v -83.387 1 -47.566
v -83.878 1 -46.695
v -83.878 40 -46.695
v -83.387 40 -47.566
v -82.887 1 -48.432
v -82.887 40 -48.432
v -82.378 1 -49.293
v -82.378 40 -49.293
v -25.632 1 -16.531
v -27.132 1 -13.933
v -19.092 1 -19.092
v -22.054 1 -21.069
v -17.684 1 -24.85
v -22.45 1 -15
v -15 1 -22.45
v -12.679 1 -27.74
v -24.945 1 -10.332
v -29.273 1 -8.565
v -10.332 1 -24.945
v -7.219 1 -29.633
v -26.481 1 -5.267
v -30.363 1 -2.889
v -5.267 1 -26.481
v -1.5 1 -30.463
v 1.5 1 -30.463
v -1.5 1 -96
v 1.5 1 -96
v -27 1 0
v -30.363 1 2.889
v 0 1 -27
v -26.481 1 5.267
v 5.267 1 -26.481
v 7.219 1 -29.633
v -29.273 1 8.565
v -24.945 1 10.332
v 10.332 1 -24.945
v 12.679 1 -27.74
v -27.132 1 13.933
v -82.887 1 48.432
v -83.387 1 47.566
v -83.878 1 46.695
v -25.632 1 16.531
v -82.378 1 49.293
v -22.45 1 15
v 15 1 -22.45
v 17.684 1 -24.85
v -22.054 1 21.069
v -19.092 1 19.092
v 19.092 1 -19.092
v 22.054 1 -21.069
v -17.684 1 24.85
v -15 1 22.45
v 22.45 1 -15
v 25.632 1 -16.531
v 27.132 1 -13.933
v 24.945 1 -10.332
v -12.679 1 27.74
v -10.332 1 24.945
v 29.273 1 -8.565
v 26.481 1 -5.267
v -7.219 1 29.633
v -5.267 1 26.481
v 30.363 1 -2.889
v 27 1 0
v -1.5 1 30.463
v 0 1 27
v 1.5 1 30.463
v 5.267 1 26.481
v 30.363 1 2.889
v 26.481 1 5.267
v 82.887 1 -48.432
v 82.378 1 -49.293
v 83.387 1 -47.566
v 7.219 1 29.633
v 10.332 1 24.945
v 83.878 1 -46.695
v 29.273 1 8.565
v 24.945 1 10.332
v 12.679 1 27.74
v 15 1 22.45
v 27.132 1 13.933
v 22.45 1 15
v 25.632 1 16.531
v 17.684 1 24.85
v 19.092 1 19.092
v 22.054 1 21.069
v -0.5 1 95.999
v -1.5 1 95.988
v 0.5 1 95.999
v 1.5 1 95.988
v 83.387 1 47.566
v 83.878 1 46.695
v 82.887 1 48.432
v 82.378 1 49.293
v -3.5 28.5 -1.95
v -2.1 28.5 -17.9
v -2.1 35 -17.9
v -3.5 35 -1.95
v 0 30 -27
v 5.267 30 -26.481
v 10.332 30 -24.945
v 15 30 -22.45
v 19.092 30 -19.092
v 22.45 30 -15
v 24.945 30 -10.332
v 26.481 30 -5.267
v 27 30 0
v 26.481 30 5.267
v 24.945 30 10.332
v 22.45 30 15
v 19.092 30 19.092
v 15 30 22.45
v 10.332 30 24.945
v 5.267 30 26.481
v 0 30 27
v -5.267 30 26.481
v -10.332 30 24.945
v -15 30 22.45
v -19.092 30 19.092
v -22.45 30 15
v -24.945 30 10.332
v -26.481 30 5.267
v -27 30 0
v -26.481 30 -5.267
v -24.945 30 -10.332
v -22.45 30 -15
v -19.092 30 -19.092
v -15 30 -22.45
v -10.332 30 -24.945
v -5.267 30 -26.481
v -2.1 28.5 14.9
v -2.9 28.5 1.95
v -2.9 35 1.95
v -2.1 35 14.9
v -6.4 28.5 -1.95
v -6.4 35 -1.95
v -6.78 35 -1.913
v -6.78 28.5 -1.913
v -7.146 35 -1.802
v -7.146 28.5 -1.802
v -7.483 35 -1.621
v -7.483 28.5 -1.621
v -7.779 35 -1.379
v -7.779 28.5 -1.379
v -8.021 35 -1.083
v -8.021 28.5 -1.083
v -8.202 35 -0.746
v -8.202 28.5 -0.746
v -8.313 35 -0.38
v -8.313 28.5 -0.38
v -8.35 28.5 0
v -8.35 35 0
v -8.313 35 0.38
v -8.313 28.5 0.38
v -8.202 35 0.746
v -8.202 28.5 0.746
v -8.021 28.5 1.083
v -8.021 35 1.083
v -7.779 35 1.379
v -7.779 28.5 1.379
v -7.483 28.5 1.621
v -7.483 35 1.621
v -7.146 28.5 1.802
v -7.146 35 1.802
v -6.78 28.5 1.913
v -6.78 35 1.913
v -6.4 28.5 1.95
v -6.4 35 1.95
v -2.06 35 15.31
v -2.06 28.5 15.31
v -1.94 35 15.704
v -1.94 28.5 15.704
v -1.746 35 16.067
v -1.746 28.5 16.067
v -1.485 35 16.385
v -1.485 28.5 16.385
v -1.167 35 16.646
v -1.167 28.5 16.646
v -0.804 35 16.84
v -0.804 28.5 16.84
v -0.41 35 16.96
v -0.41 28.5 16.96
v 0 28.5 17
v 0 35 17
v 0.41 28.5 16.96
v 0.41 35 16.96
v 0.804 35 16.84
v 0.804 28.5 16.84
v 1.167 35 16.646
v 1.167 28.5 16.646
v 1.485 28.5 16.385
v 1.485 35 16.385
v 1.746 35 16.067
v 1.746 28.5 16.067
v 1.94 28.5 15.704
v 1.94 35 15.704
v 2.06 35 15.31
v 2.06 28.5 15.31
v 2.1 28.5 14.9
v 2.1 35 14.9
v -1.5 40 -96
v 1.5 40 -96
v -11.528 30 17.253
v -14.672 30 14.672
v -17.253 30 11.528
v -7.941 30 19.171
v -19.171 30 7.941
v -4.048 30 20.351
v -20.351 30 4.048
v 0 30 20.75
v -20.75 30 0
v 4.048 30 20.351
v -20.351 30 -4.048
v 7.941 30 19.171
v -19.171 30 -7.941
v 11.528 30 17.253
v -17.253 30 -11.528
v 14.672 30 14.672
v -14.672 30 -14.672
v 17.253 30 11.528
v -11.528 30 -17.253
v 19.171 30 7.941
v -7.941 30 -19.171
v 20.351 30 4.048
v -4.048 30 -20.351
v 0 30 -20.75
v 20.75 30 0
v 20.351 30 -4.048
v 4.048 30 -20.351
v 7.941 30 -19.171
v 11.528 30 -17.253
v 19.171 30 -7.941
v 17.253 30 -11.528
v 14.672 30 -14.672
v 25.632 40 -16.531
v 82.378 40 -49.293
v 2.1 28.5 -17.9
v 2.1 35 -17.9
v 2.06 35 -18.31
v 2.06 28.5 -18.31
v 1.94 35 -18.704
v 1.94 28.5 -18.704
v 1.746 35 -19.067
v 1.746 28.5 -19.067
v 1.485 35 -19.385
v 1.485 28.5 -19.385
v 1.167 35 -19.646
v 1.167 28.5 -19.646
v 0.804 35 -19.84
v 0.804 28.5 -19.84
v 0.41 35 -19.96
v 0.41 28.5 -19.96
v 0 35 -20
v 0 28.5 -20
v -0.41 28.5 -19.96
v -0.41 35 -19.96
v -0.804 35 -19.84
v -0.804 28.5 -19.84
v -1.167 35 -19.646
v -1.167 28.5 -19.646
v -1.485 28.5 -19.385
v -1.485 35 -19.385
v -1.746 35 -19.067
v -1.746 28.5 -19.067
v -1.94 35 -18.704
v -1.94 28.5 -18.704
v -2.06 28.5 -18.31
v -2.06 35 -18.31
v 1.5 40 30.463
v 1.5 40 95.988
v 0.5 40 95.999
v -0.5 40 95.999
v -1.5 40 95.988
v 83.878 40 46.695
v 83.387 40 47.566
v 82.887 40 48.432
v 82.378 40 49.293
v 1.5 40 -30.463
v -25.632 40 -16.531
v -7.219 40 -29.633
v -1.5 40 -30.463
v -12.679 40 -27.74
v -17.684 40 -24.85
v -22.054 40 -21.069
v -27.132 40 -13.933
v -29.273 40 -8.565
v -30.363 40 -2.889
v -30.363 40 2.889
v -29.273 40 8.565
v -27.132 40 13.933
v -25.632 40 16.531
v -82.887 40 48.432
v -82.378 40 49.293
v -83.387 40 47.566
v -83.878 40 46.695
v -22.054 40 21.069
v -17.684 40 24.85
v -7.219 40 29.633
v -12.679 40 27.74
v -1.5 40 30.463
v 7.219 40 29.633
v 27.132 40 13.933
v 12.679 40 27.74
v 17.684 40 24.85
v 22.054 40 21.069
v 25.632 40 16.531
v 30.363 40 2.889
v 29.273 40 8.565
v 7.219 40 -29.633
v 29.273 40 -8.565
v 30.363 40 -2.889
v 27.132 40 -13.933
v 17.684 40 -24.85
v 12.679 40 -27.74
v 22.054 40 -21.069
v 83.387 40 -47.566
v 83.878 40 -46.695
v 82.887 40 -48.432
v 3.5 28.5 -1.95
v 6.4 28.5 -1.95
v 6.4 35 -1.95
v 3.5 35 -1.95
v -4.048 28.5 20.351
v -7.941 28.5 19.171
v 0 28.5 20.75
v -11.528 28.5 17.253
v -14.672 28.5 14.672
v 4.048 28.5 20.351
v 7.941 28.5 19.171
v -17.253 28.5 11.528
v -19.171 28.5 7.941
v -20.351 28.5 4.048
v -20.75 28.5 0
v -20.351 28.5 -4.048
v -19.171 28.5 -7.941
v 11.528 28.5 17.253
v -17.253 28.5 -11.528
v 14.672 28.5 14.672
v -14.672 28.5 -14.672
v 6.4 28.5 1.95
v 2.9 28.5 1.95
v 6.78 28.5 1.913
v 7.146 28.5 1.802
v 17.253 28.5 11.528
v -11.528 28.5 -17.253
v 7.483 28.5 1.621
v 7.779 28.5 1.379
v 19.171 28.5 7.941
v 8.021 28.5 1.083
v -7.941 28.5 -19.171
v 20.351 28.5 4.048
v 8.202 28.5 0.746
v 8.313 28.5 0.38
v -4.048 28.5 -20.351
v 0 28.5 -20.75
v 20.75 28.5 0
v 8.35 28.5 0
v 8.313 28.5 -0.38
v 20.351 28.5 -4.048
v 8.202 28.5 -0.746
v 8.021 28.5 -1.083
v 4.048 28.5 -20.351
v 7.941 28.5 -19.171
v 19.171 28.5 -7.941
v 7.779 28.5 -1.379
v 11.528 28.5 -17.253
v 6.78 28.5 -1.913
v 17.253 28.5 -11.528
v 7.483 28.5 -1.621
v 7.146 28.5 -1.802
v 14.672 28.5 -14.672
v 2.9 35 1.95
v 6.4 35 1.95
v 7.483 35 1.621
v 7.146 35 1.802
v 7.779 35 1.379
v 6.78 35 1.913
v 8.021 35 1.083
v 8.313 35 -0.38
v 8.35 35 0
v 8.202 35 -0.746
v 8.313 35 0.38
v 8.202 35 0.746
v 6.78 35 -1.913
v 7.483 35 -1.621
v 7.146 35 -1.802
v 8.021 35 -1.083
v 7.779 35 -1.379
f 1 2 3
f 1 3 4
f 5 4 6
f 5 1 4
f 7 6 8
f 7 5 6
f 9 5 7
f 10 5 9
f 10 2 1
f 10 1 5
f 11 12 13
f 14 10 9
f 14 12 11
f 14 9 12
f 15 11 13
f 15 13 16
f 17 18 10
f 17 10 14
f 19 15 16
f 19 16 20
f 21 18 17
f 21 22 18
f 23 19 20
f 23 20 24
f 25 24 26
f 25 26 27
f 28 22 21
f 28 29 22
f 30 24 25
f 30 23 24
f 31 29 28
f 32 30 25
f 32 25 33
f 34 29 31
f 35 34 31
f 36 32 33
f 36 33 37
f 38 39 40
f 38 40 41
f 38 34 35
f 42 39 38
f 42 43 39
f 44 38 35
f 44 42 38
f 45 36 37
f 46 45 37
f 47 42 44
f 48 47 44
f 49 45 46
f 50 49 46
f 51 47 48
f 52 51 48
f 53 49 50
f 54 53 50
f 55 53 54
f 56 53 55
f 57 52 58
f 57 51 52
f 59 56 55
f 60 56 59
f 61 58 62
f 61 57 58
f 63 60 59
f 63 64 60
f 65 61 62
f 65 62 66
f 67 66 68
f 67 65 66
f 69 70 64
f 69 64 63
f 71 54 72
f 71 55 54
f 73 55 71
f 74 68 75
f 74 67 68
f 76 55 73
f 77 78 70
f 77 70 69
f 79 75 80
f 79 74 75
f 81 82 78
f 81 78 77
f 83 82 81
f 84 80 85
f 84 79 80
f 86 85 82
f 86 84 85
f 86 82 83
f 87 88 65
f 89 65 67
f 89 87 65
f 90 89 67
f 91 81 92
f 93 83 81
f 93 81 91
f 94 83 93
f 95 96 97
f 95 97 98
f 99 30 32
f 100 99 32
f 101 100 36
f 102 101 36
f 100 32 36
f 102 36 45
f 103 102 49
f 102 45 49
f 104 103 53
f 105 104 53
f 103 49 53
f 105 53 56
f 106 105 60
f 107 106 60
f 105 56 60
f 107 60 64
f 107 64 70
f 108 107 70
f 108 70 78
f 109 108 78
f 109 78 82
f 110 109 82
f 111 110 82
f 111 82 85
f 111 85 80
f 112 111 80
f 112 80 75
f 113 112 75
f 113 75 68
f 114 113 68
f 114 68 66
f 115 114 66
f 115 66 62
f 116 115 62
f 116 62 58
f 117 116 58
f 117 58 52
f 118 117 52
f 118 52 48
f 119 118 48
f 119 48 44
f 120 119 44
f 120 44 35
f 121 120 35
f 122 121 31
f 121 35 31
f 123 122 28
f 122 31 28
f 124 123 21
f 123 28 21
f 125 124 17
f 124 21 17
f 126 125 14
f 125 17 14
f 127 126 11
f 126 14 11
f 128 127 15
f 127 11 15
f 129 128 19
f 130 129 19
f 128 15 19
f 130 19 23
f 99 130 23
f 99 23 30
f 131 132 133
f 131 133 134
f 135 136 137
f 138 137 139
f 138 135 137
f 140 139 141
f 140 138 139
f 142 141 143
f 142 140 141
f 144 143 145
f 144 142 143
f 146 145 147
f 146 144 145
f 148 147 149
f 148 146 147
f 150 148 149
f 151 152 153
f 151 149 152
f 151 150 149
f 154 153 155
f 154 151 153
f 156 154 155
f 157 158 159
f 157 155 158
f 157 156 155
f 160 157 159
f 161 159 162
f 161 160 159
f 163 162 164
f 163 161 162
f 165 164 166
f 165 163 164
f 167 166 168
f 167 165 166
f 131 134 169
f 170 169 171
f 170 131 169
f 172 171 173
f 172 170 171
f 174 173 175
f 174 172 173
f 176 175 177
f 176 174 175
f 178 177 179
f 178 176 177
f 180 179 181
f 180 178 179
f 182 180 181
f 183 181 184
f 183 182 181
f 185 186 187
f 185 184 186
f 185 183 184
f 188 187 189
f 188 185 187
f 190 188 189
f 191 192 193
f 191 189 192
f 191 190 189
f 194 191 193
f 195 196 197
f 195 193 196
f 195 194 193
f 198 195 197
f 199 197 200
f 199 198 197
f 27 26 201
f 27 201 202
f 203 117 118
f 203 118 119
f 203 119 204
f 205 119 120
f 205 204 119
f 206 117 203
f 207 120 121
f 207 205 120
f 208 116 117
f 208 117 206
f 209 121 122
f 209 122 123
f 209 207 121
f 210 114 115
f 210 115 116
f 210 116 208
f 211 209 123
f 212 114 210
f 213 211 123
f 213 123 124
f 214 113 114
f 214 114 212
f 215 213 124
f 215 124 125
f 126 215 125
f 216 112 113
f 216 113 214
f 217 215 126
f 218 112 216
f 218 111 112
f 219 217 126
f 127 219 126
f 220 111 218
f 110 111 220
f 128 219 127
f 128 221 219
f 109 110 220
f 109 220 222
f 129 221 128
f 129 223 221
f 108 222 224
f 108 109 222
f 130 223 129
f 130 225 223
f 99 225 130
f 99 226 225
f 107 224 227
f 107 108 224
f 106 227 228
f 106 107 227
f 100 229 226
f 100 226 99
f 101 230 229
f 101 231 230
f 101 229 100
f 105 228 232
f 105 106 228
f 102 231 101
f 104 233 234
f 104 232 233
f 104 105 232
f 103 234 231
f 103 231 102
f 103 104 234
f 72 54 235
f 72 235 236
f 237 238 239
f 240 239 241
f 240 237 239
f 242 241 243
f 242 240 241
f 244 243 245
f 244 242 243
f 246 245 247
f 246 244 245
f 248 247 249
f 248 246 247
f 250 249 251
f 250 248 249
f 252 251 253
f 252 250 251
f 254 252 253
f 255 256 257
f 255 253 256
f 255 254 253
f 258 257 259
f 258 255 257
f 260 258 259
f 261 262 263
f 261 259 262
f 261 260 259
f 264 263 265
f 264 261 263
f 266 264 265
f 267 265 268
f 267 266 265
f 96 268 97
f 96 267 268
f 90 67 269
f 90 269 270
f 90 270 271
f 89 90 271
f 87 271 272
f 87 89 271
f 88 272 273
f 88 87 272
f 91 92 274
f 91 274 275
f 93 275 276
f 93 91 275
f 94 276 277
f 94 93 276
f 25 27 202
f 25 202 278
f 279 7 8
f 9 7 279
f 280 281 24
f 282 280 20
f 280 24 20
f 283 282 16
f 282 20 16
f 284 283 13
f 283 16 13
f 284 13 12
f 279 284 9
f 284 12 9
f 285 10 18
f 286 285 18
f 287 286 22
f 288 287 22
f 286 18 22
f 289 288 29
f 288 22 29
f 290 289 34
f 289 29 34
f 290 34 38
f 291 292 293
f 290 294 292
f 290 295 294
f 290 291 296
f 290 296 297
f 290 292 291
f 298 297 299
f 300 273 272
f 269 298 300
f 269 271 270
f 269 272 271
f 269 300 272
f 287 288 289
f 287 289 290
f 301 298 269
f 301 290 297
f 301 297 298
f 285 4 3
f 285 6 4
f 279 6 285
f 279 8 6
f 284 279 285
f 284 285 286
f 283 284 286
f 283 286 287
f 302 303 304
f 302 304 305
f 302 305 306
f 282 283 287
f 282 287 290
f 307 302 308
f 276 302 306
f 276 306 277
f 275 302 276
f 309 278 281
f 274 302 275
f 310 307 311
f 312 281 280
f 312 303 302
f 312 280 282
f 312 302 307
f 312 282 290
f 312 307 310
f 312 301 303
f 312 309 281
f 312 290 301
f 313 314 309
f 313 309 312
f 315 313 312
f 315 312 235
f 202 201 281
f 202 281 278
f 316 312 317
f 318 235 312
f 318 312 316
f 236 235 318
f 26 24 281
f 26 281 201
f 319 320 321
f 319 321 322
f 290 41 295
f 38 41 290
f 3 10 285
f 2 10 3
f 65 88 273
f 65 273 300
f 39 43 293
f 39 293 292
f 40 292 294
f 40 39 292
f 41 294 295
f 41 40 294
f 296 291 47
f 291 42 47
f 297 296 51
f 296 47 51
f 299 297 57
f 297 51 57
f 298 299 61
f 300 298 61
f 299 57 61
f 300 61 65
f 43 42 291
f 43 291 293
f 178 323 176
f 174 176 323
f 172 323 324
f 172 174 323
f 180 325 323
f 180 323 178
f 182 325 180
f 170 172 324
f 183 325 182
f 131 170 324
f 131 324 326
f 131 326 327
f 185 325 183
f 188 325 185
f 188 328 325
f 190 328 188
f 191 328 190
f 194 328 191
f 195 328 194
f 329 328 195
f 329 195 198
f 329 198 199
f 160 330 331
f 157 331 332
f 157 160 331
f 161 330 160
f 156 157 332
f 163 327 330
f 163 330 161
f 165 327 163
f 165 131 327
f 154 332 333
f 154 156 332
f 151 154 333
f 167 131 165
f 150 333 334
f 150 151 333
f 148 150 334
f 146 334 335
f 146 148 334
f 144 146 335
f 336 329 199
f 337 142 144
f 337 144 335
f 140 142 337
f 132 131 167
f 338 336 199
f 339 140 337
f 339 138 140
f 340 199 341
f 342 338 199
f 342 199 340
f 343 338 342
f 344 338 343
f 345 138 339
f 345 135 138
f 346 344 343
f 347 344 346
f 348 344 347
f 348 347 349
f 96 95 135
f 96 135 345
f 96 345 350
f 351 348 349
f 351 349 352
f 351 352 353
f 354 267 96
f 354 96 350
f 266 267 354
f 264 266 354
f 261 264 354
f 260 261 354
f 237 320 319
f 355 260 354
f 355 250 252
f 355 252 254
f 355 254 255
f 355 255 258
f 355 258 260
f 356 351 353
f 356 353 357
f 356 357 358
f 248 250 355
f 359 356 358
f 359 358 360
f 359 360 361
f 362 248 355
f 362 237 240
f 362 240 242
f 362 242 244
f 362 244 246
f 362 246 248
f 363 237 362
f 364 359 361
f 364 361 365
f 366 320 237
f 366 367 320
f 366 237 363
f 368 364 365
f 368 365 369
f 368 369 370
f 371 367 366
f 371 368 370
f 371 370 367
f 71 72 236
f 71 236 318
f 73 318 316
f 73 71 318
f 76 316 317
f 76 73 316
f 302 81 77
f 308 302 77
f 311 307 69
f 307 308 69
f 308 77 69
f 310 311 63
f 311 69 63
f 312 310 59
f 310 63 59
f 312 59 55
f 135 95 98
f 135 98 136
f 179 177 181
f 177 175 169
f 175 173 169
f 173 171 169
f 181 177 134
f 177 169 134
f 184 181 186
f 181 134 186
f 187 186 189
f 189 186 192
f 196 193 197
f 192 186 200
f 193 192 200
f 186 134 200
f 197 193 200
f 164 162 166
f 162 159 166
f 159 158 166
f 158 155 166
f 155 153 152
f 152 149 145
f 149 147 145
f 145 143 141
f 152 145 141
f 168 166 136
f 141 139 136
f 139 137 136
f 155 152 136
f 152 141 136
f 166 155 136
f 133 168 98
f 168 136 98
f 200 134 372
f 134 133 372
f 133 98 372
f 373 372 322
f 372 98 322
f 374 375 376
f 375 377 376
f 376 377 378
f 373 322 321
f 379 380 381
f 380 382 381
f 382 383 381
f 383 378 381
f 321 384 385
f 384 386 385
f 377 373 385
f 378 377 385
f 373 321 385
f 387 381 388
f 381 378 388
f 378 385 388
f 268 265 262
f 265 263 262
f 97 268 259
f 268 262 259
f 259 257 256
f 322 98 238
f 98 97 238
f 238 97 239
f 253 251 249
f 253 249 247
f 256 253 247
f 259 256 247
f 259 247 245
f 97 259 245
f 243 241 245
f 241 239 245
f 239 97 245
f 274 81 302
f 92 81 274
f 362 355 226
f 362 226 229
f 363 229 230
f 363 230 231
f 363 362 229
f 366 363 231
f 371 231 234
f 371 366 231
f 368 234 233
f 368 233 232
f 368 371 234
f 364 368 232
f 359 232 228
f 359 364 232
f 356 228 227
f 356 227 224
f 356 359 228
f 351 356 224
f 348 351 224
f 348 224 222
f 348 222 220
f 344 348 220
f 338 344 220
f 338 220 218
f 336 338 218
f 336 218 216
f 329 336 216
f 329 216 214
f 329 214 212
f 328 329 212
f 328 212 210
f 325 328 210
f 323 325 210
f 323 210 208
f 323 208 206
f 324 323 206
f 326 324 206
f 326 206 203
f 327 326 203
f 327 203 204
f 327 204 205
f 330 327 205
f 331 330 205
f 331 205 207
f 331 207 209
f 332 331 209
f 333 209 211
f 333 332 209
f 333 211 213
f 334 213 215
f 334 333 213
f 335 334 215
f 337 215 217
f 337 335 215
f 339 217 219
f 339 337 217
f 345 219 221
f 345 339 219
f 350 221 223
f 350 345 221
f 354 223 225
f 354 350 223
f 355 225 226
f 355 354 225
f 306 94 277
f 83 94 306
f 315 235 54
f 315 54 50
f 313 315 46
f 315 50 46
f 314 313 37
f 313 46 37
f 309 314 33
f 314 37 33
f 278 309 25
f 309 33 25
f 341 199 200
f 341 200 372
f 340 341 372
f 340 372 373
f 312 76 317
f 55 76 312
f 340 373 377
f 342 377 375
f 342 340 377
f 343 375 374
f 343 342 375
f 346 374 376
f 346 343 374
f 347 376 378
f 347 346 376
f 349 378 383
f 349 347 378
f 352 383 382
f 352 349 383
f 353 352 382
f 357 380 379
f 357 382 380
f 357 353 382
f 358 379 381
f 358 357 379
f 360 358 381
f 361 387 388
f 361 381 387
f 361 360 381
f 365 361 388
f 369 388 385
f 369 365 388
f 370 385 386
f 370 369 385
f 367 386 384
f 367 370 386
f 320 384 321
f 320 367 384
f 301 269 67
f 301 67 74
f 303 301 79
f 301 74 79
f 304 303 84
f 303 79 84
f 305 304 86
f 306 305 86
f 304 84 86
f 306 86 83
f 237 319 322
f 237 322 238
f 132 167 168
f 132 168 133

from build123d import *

# Parameters (mm, degrees)
SKETCH_1_R          = 20.5
EXTRUDE_1_DEPTH     = 40
SKETCH_2_R          = 21
EXTRUDE_2_DEPTH     = 35
SKETCH_4_R          = 20.75
CUT_EXTRUDE_2_DEPTH = 28.5
CUT_EXTRUDE_3_DEPTH = 17
EXTRUDE_START       = -40
SKETCH_7_R          = 30.5
SKETCH_7_R_2        = 24.5
EXTRUDE_4_DEPTH     = 40
SKETCH_8_R          = 27
SKETCH_8_R_2        = 20.75
CUT_EXTRUDE_4_DEPTH = 30
SKETCH_9_R          = 20.5
EXTRUDE_5_DEPTH     = 5
SKETCH_11_R         = 155.050037834
CUT_EXTRUDE_5_DEPTH = 1


with BuildPart() as part:
    # 草图1 → 凸台-拉伸1 (new body)
    with BuildSketch(Plane(origin=(0, 0, 0), x_dir=(1, 0, 0), z_dir=(0, 1, 0))):
        with BuildLine():
            Line((82.378289409, -49.293178373), (20.427818585, -13.526057366))
            ThreePointArc((20.427818585, -13.526057366), (12.25, -21.217622393), (1.5, -24.454038521))
            Line((1.5, -24.454038521), (1.5, -95.988280535))
            ThreePointArc((1.5, -95.988280535), (0, -96), (-1.5, -95.988280535))
            Line((-1.5, -95.988280535), (-1.5, -24.454038521))
            ThreePointArc((-1.5, -24.454038521), (-12.25, -21.217622393), (-20.427818585, -13.526057366))
            Line((-20.427818585, -13.526057366), (-82.378289409, -49.293178373))
            ThreePointArc((-82.378289409, -49.293178373), (-83.138438763, -48), (-83.878289409, -46.695102162))
            Line((-83.878289409, -46.695102162), (-21.927818585, -10.927981155))
            ThreePointArc((-21.927818585, -10.927981155), (-24.5, 0), (-21.927818585, 10.927981155))
            Line((-21.927818585, 10.927981155), (-83.878289409, 46.695102162))
            ThreePointArc((-83.878289409, 46.695102162), (-83.138438763, 48), (-82.378289409, 49.293178373))
            Line((-82.378289409, 49.293178373), (-20.427818585, 13.526057366))
            ThreePointArc((-20.427818585, 13.526057366), (-12.25, 21.217622393), (-1.5, 24.454038521))
            Line((-1.5, 24.454038521), (-1.5, 96))
            Line((-1.5, 96), (0.874477385, 96))
            Line((0.874477385, 96), (1.5, 96))
            Line((1.5, 96), (1.5, 24.454038521))
            ThreePointArc((1.5, 24.454038521), (12.25, 21.217622393), (20.427818585, 13.526057366))
            Line((20.427818585, 13.526057366), (82.378289409, 49.293178373))
            ThreePointArc((82.378289409, 49.293178373), (83.138438763, 48), (83.878289409, 46.695102162))
            Line((83.878289409, 46.695102162), (21.927818585, 10.927981155))
            ThreePointArc((21.927818585, 10.927981155), (24.5, 0), (21.927818585, -10.927981155))
            Line((21.927818585, -10.927981155), (83.878289409, -46.695102162))
            ThreePointArc((83.878289409, -46.695102162), (83.138438763, -48), (82.378289409, -49.293178373))
        make_face()
        with Locations(Location((0, 0, 0), (0, 0, 270))):
            Circle(SKETCH_1_R, mode=Mode.SUBTRACT)
    extrude(amount=EXTRUDE_1_DEPTH)

    # 草图2 → 凸台-拉伸2 (add)
    with BuildSketch(Plane.XZ):
        Circle(SKETCH_2_R)
    extrude(amount=-EXTRUDE_2_DEPTH)

    # 草图4 → 切除-拉伸2 (cut)
    with BuildSketch(Plane.XZ):
        with Locations(Location((0, 0, 0), (0, 0, 270))):
            Circle(SKETCH_4_R)
    extrude(amount=-CUT_EXTRUDE_2_DEPTH, mode=Mode.SUBTRACT)

    # 草图6 → 切除-拉伸3 (cut)
    with BuildSketch(Plane.XZ.offset(-28.5)):
        with BuildLine():
            Line((-6.4, 1.95), (-2.9, 1.95))
            Line((-2.9, 1.95), (-2.1, 14.9))
            ThreePointArc((-2.1, 14.9), (0, 17), (2.1, 14.9))
            Line((2.1, 14.9), (2.9, 1.95))
            Line((2.9, 1.95), (6.4, 1.95))
            ThreePointArc((6.4, 1.95), (8.35, 0), (6.4, -1.95))
            Line((6.4, -1.95), (3.5, -1.95))
            Line((3.5, -1.95), (2.1, -17.9))
            ThreePointArc((2.1, -17.9), (0, -20), (-2.1, -17.9))
            Line((-2.1, -17.9), (-3.5, -1.95))
            Line((-3.5, -1.95), (-6.4, -1.95))
            ThreePointArc((-6.4, -1.95), (-8.35, 0), (-6.4, 1.95))
        make_face()
    extrude(amount=-CUT_EXTRUDE_3_DEPTH, mode=Mode.SUBTRACT)

    # 草图7 → 凸台-拉伸4 (add)
    with BuildSketch(Plane(origin=(0, 40, 0), x_dir=(1, 0, 0), z_dir=(0, 1, 0)).offset(EXTRUDE_START)):
        Circle(SKETCH_7_R)
        Circle(SKETCH_7_R_2, mode=Mode.SUBTRACT)
    extrude(amount=EXTRUDE_4_DEPTH)

    # 草图8 → 切除-拉伸4 (cut)
    with BuildSketch(Plane.XZ):
        with Locations(Location((0, 0, 0), (0, 0, 270))):
            Circle(SKETCH_8_R)
        with Locations(Location((0, 0, 0), (0, 0, 270))):
            Circle(SKETCH_8_R_2, mode=Mode.SUBTRACT)
    extrude(amount=-CUT_EXTRUDE_4_DEPTH, mode=Mode.SUBTRACT)

    # 草图9 → 凸台-拉伸5 (add)
    with BuildSketch(Plane(origin=(0, 35, 0), x_dir=(1, 0, 0), z_dir=(0, 1, 0))):
        Circle(SKETCH_9_R)
    extrude(amount=EXTRUDE_5_DEPTH)

    # 草图11 → 切除-拉伸5 (cut)
    with BuildSketch(Plane.XZ):
        Circle(SKETCH_11_R)
    extrude(amount=-CUT_EXTRUDE_5_DEPTH, mode=Mode.SUBTRACT)


solid = part.part
